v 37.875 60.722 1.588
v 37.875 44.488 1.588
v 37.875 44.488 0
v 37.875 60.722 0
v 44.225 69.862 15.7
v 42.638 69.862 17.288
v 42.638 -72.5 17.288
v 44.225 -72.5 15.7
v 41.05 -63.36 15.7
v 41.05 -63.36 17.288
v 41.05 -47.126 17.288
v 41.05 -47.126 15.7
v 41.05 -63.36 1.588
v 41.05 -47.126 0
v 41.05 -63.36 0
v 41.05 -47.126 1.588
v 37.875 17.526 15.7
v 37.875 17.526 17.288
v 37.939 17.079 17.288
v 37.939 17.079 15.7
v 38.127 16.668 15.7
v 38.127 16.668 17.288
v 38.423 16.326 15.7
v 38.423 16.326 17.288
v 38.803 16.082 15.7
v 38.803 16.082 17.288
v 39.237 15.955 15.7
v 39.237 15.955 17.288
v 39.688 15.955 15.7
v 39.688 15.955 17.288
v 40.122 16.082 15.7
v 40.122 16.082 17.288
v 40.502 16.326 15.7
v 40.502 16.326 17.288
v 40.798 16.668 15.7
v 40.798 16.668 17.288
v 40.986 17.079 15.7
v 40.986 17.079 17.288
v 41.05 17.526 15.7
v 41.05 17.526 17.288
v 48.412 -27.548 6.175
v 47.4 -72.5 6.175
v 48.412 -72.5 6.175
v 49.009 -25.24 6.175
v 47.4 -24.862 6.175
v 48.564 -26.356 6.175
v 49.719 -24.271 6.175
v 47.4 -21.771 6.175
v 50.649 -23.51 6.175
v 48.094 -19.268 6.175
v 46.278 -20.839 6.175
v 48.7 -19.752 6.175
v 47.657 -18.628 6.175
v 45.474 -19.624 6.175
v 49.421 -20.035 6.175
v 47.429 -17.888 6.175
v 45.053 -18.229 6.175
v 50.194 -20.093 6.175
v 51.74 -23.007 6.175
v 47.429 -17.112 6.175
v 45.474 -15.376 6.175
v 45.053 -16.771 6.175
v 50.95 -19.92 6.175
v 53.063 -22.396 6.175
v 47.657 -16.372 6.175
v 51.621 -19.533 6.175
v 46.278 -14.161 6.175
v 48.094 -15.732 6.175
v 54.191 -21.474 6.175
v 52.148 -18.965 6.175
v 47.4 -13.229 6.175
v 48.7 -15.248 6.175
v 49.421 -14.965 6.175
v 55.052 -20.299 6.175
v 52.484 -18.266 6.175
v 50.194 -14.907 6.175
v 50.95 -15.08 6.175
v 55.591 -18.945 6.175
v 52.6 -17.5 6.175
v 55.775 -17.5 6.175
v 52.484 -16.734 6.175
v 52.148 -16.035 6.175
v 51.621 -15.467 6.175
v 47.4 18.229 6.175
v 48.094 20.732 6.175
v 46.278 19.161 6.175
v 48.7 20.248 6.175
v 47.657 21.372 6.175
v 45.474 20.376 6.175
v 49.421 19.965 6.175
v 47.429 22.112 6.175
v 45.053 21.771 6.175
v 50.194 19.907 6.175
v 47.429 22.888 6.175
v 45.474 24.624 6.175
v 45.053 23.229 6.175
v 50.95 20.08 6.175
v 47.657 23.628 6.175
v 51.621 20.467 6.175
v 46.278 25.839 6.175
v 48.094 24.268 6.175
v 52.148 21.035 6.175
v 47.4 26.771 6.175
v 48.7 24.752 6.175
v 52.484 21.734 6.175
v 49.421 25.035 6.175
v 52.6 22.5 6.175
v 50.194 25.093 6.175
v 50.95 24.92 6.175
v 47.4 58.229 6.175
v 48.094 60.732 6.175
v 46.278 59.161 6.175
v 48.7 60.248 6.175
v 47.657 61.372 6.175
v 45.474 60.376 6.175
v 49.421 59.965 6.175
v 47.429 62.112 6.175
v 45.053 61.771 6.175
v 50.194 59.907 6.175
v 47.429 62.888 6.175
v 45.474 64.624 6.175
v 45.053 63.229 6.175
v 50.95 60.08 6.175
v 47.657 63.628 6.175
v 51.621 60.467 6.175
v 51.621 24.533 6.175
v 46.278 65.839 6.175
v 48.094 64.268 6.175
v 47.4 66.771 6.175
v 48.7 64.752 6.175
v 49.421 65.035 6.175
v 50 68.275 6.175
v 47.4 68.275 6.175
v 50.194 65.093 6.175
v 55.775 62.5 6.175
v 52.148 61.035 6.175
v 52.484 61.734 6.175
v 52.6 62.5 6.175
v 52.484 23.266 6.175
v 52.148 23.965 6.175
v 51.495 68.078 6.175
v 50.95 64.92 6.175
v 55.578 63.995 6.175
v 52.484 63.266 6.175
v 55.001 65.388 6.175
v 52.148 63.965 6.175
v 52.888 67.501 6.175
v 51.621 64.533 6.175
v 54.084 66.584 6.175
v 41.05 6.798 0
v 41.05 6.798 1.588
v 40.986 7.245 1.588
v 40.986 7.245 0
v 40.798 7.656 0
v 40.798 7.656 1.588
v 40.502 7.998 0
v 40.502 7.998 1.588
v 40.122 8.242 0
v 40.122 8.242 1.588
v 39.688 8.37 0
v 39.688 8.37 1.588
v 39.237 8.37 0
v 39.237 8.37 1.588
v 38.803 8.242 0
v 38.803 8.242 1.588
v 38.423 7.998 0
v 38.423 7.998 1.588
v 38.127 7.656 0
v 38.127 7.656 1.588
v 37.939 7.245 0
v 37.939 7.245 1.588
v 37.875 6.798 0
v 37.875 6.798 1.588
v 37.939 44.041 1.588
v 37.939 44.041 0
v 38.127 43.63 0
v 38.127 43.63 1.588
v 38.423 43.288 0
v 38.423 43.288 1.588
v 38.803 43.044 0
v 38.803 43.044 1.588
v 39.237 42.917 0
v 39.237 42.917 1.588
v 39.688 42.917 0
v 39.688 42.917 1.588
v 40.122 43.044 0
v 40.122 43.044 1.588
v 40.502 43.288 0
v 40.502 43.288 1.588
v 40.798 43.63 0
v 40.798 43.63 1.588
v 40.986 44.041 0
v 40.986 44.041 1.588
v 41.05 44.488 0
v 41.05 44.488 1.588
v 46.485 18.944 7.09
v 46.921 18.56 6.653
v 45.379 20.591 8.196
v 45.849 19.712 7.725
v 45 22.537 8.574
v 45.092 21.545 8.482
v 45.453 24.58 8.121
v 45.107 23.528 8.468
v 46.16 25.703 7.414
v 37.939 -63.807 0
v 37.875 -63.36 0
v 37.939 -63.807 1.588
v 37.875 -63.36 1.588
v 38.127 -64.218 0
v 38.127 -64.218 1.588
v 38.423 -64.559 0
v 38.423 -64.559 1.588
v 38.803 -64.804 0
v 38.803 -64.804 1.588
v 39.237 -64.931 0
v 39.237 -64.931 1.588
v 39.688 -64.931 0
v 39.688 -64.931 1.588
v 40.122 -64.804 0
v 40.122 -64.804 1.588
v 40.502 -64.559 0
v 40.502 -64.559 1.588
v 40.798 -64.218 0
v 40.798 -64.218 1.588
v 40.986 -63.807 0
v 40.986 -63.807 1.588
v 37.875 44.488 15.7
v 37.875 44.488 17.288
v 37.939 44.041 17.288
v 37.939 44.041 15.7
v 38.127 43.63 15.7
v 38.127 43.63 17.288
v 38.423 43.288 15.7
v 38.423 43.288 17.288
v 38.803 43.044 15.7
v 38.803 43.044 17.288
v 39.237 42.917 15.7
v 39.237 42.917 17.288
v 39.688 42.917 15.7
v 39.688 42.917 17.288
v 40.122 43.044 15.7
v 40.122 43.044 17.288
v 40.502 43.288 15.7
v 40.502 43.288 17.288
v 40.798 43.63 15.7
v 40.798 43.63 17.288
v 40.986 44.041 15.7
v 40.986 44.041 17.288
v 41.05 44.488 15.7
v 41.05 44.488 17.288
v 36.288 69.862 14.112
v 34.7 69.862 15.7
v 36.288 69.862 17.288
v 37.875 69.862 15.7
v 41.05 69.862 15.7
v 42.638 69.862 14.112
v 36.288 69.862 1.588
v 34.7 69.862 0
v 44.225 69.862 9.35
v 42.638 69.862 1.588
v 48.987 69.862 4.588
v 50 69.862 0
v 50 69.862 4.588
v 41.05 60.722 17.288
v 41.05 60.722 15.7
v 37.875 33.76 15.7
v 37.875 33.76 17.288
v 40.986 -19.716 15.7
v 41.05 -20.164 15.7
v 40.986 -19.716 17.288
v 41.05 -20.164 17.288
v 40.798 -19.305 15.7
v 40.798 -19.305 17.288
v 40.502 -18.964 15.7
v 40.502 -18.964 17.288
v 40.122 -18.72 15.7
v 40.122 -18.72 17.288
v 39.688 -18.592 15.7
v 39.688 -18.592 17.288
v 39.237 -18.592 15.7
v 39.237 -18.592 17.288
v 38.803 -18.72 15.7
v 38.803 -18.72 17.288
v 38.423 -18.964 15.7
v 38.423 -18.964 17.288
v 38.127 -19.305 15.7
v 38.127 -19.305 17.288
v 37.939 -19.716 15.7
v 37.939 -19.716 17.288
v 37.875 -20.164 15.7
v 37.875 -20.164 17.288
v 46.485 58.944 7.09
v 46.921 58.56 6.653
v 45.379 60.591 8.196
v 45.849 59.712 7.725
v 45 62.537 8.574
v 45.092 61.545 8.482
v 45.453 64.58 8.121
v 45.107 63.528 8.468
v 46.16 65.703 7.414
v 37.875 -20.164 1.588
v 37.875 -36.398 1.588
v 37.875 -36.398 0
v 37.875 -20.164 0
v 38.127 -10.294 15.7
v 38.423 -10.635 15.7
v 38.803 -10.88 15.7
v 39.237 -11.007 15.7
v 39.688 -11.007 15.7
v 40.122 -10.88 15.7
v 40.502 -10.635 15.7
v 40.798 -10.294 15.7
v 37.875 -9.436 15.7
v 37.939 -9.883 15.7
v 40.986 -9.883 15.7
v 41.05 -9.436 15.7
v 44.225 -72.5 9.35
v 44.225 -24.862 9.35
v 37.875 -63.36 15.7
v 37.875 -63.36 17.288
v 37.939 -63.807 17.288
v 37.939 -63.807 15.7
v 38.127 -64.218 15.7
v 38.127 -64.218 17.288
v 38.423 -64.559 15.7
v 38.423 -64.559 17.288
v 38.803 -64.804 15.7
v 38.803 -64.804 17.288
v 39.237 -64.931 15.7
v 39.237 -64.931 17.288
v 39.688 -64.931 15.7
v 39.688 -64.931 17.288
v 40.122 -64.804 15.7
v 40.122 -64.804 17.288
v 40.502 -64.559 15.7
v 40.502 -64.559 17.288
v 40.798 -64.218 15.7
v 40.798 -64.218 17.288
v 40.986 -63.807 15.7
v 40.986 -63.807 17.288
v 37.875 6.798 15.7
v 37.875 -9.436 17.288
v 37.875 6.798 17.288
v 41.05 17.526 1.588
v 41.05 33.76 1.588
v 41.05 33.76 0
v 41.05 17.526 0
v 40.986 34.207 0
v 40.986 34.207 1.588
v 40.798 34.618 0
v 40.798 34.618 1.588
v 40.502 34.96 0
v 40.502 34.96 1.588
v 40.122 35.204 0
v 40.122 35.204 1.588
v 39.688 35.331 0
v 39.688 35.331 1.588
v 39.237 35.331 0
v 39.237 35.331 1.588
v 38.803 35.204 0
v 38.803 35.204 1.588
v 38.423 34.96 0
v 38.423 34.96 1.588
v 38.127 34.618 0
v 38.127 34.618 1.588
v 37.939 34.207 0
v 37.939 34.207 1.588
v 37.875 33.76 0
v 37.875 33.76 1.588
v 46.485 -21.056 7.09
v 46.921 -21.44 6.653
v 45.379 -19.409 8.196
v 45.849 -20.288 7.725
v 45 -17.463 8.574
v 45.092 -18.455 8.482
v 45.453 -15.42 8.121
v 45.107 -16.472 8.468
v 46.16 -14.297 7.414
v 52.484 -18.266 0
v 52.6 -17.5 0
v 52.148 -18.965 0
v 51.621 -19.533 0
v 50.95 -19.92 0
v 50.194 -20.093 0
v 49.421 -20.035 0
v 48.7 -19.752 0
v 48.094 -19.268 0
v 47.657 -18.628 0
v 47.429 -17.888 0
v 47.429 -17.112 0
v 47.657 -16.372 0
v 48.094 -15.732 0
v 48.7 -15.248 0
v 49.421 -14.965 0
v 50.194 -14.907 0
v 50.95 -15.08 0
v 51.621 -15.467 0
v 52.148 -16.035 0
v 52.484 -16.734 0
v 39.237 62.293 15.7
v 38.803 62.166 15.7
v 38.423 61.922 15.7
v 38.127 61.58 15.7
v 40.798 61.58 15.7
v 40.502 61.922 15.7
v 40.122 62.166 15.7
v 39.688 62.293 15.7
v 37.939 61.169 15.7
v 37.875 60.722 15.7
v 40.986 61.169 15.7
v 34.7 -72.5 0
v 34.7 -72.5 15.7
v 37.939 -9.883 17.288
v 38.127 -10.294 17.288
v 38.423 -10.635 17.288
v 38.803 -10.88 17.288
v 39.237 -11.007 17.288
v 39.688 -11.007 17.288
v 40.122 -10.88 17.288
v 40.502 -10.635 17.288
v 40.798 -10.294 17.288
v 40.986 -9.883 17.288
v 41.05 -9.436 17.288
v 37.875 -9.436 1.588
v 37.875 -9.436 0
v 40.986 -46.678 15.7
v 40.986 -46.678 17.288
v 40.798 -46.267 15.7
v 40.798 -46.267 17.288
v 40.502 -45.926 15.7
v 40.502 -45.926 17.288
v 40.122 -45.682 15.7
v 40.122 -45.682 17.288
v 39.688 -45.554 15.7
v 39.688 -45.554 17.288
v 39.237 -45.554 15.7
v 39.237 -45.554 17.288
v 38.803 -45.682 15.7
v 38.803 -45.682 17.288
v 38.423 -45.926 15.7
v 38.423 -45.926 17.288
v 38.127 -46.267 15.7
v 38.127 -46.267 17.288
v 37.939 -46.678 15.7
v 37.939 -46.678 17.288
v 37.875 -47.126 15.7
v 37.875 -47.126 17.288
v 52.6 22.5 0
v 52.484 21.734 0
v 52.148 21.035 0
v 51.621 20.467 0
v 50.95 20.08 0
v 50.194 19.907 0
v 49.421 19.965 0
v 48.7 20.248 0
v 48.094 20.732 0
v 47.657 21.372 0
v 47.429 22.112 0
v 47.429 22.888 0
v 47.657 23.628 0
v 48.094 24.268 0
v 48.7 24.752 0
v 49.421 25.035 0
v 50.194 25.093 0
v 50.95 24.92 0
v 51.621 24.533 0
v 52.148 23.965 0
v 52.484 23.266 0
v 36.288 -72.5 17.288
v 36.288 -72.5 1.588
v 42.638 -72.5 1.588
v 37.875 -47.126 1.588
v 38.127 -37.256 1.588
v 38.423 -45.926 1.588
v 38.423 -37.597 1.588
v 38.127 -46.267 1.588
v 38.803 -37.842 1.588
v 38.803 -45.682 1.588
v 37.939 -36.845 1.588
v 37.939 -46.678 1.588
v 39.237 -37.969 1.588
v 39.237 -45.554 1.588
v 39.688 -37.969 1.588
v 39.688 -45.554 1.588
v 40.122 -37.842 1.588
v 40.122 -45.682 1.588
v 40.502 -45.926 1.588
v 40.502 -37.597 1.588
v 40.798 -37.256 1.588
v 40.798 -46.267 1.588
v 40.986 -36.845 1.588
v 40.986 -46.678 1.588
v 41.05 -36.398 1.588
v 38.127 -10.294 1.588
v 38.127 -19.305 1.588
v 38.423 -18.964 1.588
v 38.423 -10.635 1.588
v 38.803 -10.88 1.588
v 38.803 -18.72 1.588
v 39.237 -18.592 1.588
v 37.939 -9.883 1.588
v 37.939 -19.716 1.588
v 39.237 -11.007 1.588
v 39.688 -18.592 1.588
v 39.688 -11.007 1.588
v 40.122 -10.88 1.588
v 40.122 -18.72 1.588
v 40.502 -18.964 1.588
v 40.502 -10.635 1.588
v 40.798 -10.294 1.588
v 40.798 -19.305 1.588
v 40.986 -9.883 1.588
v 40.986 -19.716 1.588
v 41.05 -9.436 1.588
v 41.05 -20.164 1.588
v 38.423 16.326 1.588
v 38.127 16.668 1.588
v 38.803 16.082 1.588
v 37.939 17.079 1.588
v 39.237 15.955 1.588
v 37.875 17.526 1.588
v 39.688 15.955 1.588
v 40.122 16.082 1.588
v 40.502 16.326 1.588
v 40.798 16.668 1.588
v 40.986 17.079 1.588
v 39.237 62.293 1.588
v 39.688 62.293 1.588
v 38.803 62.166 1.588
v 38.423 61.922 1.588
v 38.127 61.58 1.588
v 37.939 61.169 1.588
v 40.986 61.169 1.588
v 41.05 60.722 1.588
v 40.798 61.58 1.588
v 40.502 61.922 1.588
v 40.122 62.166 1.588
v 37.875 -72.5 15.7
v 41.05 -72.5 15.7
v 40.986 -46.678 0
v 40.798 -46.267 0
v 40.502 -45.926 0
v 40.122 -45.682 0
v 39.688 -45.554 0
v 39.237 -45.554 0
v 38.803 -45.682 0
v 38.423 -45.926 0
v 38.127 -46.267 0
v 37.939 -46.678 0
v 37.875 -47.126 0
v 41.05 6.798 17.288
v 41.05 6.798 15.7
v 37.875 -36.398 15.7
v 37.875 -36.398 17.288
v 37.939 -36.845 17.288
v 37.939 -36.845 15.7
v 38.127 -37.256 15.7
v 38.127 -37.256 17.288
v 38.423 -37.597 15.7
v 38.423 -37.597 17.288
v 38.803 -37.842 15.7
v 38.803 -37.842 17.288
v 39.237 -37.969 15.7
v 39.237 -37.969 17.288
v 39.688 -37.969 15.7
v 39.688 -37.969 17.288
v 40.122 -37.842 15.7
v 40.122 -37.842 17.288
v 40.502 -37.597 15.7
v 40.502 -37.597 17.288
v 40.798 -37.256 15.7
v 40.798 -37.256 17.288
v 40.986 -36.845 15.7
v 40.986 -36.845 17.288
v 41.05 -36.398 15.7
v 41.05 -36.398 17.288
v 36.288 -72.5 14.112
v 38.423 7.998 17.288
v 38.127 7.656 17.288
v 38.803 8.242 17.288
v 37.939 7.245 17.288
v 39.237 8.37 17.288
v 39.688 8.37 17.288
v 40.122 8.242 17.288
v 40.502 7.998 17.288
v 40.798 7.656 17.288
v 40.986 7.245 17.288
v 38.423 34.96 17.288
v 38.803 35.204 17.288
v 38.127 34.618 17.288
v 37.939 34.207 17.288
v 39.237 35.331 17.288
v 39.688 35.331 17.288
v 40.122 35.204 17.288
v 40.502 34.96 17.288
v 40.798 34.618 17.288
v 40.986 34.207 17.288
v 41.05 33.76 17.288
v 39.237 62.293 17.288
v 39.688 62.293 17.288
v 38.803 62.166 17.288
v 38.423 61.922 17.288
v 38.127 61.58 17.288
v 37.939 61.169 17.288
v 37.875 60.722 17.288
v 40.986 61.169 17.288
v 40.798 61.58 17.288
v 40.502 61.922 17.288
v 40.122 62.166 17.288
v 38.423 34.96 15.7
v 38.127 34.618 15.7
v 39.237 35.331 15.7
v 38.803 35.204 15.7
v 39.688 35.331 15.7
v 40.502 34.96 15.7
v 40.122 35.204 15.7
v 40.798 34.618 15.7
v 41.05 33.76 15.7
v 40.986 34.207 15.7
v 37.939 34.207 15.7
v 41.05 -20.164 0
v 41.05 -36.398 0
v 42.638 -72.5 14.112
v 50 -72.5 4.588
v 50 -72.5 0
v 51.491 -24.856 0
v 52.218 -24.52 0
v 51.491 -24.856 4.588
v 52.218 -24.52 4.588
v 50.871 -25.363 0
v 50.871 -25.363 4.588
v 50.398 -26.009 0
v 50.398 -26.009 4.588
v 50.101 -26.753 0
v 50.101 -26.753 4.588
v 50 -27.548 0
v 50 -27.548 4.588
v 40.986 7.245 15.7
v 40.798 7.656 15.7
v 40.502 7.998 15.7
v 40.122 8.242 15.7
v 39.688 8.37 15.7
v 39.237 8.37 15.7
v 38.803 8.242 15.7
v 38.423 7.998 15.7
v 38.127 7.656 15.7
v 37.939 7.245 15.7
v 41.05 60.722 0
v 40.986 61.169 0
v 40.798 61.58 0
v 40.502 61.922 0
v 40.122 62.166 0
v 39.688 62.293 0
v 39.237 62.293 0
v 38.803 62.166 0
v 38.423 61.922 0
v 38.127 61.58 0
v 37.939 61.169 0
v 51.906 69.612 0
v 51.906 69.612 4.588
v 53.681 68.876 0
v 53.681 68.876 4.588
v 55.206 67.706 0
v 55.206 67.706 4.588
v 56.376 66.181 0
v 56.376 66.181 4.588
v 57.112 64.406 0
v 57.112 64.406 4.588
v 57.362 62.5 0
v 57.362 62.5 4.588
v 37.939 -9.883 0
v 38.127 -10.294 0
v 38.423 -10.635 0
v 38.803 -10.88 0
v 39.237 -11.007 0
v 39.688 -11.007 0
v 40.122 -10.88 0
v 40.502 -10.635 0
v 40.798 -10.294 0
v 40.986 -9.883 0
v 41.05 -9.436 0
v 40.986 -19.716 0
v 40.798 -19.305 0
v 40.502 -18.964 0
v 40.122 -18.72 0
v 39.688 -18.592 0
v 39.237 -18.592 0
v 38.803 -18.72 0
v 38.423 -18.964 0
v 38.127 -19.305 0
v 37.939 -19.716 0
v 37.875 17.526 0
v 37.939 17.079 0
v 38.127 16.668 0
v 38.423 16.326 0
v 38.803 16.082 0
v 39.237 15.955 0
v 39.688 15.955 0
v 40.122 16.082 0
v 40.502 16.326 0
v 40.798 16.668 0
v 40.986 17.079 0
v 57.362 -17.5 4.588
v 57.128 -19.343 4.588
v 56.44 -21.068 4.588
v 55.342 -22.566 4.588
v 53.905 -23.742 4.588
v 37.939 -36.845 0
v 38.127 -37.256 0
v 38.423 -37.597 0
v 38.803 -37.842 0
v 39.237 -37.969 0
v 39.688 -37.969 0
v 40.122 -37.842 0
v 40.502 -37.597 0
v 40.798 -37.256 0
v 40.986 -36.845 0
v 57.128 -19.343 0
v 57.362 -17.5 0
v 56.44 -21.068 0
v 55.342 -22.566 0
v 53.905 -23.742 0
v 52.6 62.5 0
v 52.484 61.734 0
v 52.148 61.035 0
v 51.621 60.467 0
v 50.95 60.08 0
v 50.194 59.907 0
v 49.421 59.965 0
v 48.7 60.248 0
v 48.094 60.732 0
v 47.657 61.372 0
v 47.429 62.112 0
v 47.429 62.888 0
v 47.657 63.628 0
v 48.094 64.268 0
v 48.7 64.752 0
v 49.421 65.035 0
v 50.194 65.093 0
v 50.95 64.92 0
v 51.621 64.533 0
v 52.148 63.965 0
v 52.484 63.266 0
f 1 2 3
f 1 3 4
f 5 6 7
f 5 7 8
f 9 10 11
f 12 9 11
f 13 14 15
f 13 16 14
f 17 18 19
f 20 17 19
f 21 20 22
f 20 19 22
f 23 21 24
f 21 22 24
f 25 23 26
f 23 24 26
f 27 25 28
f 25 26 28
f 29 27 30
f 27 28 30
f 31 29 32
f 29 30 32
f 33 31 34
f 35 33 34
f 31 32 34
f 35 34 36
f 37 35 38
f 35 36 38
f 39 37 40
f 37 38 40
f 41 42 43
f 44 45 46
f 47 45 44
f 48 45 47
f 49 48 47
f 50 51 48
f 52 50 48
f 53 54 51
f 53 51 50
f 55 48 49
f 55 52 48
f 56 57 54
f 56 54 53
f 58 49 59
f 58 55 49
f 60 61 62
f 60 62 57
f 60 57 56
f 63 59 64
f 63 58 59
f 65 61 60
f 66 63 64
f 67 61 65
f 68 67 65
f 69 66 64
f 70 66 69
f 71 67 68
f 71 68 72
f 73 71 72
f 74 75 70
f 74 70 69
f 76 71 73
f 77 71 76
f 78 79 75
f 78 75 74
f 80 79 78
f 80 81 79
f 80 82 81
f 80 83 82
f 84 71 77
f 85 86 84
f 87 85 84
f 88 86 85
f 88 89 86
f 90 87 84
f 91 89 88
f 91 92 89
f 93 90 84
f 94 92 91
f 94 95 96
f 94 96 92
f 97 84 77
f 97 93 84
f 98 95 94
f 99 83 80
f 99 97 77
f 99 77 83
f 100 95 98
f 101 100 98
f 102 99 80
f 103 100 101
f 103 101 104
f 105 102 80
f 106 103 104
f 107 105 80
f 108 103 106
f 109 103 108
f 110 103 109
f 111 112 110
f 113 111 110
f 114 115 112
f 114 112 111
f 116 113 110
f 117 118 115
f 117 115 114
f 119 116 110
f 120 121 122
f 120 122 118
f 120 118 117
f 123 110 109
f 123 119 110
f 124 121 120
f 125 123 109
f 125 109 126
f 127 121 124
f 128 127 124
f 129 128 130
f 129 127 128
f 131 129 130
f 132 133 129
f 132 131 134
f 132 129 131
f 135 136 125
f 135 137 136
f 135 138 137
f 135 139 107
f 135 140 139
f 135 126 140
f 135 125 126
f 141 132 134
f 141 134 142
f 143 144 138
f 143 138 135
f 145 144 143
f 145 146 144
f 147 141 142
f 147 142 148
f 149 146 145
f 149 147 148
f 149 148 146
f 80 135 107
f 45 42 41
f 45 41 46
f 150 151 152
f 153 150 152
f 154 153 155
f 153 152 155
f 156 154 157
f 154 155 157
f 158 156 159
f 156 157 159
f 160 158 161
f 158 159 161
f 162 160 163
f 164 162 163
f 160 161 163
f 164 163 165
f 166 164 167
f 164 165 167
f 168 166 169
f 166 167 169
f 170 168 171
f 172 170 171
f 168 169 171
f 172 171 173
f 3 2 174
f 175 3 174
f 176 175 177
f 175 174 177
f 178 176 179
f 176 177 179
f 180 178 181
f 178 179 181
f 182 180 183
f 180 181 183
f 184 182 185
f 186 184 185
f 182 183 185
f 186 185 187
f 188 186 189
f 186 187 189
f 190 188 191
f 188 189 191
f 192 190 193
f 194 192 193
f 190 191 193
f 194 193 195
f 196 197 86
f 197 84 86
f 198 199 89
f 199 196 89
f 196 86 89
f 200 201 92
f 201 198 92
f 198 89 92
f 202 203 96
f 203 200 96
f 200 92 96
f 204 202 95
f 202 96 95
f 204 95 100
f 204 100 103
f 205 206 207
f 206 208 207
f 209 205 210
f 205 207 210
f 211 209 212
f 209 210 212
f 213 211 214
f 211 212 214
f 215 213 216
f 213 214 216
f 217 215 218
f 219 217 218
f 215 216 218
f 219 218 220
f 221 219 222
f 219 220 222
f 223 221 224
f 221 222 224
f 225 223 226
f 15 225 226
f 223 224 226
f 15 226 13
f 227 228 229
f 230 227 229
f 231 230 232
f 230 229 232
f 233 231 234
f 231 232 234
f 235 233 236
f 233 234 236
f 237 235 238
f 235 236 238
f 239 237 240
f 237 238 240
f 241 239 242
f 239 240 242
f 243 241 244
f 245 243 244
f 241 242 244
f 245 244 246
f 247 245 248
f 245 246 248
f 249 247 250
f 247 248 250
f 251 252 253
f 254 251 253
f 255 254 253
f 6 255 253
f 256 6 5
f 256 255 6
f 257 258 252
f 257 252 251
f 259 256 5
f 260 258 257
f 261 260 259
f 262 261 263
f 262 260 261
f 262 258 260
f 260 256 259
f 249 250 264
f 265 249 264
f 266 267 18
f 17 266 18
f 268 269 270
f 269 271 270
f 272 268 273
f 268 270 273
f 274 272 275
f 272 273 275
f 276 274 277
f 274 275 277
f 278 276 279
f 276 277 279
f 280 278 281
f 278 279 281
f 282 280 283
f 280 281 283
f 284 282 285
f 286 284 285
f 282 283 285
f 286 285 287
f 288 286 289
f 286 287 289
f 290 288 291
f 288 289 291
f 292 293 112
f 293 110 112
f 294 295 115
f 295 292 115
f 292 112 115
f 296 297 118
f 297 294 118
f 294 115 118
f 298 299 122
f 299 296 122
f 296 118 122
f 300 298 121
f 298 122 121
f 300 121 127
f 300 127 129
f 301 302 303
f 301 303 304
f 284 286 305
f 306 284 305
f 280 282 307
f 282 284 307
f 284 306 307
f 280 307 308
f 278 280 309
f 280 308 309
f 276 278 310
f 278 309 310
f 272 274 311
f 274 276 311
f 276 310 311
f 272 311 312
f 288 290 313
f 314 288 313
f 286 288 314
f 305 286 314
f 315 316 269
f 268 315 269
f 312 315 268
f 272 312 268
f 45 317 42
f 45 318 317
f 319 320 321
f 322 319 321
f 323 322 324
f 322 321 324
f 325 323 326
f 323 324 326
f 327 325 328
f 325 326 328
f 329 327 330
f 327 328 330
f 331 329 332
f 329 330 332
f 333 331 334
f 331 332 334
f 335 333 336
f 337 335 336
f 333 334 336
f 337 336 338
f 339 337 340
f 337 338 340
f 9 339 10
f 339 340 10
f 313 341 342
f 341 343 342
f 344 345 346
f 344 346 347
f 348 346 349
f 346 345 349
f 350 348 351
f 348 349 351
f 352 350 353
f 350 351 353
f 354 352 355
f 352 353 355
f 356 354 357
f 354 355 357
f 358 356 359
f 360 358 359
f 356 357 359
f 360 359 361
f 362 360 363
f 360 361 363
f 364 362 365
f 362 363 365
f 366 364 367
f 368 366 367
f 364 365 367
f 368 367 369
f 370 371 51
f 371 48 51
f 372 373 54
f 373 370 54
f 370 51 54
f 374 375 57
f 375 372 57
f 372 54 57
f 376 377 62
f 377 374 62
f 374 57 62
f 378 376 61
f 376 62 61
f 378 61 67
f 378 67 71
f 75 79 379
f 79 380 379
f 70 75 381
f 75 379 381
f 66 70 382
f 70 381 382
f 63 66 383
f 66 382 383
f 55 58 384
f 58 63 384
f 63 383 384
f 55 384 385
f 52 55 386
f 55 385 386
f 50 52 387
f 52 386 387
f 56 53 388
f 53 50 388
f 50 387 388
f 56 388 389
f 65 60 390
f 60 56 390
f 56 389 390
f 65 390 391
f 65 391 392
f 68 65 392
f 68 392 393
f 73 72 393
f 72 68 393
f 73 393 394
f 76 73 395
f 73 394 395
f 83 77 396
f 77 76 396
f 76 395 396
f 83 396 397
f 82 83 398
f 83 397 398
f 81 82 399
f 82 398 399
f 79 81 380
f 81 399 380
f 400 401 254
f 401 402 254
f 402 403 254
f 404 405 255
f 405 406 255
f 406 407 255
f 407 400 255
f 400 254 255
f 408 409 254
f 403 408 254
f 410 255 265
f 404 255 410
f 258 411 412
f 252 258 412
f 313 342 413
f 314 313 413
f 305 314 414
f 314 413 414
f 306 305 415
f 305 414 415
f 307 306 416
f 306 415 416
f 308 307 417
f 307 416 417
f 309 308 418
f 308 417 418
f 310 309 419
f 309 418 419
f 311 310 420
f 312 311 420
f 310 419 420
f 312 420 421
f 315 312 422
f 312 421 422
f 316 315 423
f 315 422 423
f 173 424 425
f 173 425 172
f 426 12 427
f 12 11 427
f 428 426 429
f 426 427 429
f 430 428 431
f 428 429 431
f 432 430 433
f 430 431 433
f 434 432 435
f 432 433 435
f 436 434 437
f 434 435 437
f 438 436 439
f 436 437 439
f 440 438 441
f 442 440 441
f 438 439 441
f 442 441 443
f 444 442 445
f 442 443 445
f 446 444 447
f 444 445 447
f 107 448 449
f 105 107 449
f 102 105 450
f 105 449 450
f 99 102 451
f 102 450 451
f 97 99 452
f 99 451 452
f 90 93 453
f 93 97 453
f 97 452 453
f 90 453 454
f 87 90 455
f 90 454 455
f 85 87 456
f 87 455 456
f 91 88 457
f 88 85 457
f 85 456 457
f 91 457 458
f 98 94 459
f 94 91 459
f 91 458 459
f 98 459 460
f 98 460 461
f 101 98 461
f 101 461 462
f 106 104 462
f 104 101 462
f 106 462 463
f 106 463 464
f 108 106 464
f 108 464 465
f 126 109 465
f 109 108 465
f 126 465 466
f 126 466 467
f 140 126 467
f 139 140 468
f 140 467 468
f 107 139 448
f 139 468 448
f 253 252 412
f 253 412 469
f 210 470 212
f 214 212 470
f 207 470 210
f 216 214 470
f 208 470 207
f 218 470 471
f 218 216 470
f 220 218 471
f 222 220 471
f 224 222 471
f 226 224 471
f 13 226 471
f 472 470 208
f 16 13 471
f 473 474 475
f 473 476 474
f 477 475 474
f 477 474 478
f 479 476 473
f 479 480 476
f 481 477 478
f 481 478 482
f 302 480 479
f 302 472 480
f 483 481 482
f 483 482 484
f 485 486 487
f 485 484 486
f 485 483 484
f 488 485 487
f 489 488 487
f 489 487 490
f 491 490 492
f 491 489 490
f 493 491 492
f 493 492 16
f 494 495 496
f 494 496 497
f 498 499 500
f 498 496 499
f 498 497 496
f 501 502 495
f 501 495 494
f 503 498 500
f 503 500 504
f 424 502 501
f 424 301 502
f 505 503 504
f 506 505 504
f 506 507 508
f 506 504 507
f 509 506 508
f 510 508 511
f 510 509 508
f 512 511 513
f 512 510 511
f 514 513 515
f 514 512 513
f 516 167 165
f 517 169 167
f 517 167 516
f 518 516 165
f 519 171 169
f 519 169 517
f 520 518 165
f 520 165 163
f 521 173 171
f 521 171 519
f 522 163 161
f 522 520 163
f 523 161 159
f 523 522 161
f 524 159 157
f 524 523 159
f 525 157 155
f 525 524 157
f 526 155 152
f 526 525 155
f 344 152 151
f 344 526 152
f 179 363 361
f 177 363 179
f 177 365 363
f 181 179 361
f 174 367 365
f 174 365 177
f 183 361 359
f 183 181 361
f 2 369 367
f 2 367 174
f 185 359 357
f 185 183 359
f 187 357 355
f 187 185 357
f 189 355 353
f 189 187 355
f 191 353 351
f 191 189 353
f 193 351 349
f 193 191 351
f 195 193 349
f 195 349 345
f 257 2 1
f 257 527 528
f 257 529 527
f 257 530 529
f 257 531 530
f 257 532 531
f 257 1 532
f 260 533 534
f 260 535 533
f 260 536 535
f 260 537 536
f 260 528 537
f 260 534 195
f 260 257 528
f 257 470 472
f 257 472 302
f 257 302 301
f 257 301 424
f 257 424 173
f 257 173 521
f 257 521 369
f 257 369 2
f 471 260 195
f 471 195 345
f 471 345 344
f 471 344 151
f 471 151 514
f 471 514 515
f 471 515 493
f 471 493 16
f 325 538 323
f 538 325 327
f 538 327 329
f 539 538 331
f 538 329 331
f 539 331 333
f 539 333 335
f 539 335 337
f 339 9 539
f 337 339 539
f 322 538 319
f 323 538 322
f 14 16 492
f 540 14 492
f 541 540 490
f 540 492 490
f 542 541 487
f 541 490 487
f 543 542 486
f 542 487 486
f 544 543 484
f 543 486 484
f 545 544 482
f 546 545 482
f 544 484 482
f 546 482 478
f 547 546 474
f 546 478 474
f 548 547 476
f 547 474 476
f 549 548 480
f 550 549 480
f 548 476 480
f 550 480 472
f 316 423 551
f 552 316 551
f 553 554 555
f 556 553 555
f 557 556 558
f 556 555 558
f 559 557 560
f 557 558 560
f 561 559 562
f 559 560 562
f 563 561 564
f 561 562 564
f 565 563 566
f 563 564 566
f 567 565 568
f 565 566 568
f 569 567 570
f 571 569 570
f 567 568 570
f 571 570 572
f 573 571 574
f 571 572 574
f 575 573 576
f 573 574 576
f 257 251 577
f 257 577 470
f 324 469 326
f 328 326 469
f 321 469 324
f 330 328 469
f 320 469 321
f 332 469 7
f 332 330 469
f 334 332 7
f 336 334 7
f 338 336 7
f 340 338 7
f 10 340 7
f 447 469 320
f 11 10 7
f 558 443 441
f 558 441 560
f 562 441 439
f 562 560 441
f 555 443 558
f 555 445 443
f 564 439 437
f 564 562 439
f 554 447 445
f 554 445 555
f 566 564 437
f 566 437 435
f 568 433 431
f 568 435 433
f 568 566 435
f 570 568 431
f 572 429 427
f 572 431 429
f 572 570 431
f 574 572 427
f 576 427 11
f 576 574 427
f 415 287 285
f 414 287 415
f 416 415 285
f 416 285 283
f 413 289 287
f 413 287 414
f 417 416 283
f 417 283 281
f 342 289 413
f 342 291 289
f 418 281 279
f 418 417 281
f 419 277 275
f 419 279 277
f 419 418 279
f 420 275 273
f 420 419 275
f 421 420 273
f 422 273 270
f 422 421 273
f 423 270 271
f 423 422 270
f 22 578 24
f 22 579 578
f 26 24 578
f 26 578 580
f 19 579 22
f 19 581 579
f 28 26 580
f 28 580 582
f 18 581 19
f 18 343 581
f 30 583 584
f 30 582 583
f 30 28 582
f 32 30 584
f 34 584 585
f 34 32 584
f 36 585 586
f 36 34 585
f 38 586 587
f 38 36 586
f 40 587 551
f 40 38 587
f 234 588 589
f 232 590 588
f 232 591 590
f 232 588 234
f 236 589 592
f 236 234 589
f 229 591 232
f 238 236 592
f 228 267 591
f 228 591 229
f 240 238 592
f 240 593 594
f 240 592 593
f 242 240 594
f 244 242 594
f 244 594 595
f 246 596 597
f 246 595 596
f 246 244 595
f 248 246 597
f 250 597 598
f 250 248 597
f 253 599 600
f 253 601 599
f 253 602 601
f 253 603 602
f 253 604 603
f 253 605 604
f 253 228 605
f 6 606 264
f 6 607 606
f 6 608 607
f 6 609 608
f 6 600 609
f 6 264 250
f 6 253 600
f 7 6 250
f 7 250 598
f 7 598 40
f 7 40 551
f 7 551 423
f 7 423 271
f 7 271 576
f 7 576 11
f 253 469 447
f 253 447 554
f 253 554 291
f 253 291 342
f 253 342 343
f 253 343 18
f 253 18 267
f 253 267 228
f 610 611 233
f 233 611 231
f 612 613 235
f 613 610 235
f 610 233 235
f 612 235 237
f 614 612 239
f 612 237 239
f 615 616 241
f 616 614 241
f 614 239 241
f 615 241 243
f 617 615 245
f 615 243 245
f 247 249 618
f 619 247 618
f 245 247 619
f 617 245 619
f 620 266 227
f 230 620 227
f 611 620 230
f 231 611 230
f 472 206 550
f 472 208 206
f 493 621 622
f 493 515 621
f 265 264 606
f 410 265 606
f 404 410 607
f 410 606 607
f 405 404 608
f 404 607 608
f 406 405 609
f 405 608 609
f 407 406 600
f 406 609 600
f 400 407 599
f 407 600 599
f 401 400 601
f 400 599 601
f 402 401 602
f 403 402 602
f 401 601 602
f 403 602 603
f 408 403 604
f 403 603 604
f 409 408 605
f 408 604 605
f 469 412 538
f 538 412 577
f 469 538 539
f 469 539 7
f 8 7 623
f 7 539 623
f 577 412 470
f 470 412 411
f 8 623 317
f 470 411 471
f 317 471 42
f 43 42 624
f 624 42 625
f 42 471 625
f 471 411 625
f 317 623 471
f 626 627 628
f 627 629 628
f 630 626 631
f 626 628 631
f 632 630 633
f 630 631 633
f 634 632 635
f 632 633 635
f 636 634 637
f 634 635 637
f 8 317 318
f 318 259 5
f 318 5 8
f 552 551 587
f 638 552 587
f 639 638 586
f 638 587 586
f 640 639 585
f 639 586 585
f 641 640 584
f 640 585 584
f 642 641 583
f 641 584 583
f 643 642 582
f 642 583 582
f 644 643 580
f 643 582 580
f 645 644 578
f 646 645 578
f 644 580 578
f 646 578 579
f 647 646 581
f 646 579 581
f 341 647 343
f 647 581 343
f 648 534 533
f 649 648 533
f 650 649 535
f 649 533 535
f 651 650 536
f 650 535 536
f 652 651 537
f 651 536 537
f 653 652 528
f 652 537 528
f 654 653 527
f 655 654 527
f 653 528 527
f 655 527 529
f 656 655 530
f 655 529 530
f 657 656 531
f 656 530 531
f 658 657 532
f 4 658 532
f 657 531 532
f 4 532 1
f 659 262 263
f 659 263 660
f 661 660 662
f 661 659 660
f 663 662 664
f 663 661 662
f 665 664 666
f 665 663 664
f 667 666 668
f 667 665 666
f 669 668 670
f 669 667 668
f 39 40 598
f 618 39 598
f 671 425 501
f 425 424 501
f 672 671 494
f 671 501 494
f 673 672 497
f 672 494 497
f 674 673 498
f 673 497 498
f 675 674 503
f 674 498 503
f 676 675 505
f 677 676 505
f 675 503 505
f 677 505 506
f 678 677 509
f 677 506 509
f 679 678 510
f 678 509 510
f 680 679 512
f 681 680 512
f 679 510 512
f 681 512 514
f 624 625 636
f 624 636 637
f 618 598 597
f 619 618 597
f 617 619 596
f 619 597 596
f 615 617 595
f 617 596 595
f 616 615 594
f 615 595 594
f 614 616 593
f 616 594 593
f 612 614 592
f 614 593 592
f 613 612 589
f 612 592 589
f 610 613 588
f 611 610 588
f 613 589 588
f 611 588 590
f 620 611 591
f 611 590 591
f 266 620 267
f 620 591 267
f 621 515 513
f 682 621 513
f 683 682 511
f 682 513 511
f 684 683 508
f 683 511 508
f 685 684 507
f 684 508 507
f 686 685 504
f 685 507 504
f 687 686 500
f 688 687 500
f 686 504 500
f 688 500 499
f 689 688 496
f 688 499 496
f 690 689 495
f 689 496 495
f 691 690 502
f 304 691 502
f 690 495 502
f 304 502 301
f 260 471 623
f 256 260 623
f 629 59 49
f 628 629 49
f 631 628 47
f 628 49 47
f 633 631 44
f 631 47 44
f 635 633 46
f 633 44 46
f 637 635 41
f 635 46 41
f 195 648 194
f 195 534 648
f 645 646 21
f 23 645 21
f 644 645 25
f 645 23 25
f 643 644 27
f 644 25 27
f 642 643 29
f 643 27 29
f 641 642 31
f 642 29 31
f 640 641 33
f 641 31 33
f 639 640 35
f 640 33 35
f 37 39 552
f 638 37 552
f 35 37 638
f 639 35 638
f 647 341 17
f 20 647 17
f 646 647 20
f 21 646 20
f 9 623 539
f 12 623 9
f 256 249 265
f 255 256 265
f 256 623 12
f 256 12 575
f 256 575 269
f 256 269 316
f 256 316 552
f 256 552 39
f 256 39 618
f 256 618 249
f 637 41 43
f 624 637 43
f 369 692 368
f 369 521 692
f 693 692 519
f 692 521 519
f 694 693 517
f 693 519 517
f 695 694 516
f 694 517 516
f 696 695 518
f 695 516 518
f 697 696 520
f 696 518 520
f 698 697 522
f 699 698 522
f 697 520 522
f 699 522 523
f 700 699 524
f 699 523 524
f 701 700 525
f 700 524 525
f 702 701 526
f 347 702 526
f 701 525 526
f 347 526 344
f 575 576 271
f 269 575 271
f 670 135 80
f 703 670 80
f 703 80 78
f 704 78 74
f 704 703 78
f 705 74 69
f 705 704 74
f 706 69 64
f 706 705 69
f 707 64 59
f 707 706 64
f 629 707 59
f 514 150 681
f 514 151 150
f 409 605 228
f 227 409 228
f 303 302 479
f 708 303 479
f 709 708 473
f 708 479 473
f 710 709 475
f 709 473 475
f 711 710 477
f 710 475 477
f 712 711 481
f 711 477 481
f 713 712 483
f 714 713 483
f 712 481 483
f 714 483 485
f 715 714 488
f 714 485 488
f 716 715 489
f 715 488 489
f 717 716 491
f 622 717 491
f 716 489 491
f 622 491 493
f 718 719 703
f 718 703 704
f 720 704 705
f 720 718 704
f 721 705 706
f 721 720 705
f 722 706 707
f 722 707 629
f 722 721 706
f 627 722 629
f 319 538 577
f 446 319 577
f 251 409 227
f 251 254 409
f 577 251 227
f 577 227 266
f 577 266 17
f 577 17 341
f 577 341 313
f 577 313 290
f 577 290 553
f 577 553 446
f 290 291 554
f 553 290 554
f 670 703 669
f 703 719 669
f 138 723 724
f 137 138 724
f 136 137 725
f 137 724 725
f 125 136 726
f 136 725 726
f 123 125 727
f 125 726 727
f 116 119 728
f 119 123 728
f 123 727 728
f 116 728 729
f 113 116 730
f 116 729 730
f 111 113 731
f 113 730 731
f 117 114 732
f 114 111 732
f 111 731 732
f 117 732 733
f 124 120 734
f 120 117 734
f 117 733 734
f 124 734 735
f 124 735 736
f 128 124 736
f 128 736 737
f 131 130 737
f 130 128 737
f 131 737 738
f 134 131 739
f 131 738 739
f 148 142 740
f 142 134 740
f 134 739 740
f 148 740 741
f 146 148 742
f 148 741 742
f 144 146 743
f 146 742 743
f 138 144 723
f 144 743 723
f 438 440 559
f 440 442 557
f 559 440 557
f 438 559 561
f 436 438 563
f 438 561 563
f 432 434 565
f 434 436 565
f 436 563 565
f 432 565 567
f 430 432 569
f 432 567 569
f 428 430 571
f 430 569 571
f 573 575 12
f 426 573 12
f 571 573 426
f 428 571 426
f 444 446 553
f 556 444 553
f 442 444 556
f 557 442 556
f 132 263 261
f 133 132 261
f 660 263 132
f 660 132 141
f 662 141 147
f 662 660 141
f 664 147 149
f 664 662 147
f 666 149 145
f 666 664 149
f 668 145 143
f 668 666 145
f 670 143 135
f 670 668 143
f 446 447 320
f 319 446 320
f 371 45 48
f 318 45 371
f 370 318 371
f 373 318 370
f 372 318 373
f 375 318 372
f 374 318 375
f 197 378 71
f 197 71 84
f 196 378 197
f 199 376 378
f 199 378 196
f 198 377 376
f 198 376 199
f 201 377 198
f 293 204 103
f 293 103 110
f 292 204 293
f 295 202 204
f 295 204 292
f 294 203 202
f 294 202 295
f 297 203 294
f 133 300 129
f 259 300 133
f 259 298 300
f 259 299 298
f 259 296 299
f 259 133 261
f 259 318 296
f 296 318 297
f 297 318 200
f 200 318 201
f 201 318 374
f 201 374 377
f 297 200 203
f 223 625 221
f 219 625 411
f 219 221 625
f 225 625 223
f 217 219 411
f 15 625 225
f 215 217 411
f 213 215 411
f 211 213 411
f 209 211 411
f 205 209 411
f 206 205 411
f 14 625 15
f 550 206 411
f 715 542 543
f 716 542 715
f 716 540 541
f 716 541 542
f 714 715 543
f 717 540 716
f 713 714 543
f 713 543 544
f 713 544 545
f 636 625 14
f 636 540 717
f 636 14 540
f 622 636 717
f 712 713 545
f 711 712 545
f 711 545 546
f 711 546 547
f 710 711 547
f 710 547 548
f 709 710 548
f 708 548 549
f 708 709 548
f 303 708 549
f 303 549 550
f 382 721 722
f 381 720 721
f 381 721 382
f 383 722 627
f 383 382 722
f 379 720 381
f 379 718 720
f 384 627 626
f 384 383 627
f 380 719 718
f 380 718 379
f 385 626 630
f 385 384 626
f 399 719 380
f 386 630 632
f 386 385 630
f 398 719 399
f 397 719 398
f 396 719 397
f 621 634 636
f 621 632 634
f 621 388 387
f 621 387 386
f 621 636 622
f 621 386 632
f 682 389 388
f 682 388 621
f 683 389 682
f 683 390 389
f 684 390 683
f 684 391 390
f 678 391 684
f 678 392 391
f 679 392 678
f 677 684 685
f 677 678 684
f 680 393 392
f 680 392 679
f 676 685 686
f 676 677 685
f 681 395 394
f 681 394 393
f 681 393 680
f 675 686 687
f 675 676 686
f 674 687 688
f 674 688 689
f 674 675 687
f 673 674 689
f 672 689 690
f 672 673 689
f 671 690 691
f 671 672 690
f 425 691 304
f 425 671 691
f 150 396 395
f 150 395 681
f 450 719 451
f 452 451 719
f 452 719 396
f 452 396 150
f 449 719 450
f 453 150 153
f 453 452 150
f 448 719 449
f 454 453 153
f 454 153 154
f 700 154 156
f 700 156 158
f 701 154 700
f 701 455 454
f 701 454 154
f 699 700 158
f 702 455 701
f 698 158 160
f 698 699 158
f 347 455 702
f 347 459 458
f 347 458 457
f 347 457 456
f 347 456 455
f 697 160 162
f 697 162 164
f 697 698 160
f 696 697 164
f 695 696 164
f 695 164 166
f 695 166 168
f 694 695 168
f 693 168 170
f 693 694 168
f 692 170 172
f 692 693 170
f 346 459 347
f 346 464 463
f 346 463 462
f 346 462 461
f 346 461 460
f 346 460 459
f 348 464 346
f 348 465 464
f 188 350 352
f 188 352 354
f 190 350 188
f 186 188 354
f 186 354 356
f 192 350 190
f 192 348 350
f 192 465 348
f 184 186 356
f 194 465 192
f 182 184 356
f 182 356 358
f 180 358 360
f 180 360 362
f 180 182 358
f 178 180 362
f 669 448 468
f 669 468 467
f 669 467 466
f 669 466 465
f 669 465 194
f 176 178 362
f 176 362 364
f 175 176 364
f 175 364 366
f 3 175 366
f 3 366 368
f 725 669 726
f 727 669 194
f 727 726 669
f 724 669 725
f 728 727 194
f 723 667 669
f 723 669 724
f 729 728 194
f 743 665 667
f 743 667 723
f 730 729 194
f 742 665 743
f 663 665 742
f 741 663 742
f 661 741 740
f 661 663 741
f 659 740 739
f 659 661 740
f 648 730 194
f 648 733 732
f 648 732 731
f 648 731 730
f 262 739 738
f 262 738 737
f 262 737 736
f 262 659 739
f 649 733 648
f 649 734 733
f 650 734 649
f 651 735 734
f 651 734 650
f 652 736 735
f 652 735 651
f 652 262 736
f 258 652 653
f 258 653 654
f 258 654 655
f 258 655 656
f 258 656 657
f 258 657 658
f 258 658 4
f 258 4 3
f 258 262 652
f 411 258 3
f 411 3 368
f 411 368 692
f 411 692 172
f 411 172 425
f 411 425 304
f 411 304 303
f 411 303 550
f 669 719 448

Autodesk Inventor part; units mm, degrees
ref_plane "Work Plane1" through (0, 0, 0) normal (0, 0, 1) x (1, 0, 0)
sketch "Sketch1" plane through (0, 0, 0) normal (0, 0, 1) x (1, 0, 0)
  circle A0 centre (50, -17.5) radius 2.6 projected
  circle A1 centre (50, 22.5) radius 2.6 projected
  circle A2 centre (50, 62.5) radius 2.6 projected
  circle A3 centre (50, -17.5) radius 7.3625 construction
  circle A4 centre (50, 22.5) radius 7.3625 construction
  circle A5 centre (50, 62.5) radius 7.3625 construction
  line L0 (50, -24.8625) -> (42.6375, -24.8625)
  line L1 (42.6375, -24.8625) -> (42.6375, 69.8625)
  line L2 (42.6375, 69.8625) -> (50, 69.8625)
  line L3 (57.3625, -17.5) -> (57.3625, 62.5)
  arc A6 (50, -24.8625) -> (57.3625, -17.5) centre (50, -17.5) ccw
  arc A7 (57.3625, 62.5) -> (50, 69.8625) centre (50, 62.5) ccw
  circle A8 centre (50, -17.5) radius 5 construction
  point P0 (0, 0)
  dimension "d0" = 4.7625
  dimension "d1" = 10
extrude "Extrusion1" add sketch "Sketch1" along normal blind 6.175
sketch "Sketch2" plane through (0, 0, 6.175) normal (0, 0, 1) x (1, 0, 0)
  line L0 (42.6375, 69.8625) -> (42.6375, -24.8625) projected
  circle A0 centre (50, -17.5) radius 2.6 projected
  circle A1 centre (50, -17.5) radius 5 construction
  line L1 (42.6375, -24.8625) -> (50, -24.8625) construction
  line L2 (44.225, -24.8625) -> (44.225, 69.8625)
  line L3 (42.6375, 69.8625) -> (44.225, 69.8625)
  line L4 (42.6375, -24.8625) -> (44.225, -24.8625)
  point P0 (0, 0)
  dimension "d4" = 10
  dimension "d34" = 1.5875
ref_plane "Work Plane2" through (40.2375, 90.7678, 31.75) normal (0, 0, 1) x (1, 0, 0)
extrude "Extrusion2" add sketch "Sketch2" along normal blind 9.525 contours L3 L2 L4 L0
chamfer "Chamfer1" distance 3.175 angle 45 1 edges at (44.225, 22.5, 6.175)
sketch "Sketch3" plane through (0, 0, 6.175) normal (0, 0, 1) x (1, 0, 0)
  circle A0 centre (50, -17.5) radius 2.6 projected
  circle A1 centre (50, -17.5) radius 5
  circle A2 centre (50, 22.5) radius 2.6 projected
  circle A3 centre (50, 62.5) radius 2.6 projected
  circle A4 centre (50, 22.5) radius 5
  circle A5 centre (50, 62.5) radius 5
  point P0 (0, 0)
  point P1 (48.175, -15.6481)
  point P2 (48.175, -19.3519)
  point P3 (48.175, 24.3519)
  point P4 (48.175, 20.6481)
  point P5 (48.175, 64.3519)
  point P6 (48.175, 60.6481)
  dimension "d10" = 10
extrude "Extrusion3" cut sketch "Sketch3" along normal blind 25.4 contours A0 | A1 | A2 | A3 | A4 | A5
sketch "Sketch4" plane through (0, 0, 15.7) normal (0, 0, 1) x (1, 0, 0)
  line L0 (42.6375, -24.8625) -> (44.225, -24.8625) projected
  line L1 (44.225, -24.8625) -> (34.7, -24.8625)
  line L2 (34.7, -24.8625) -> (34.7, 69.8625)
  line L3 (34.7, 69.8625) -> (44.225, 69.8625)
  line L4 (44.225, 69.8625) -> (44.225, -24.8625)
  line L5 (44.225, 69.8625) -> (42.6375, 69.8625) projected
  line L6 (34.7, -24.8625) -> (36.2875, -24.8625)
  line L7 (36.2875, -24.8625) -> (36.2875, 69.8625)
  line L8 (36.2875, 69.8625) -> (34.7, 69.8625)
  line L9 (34.7, 69.8625) -> (34.7, -24.8625)
  line L10 (42.6375, 69.8625) -> (42.6375, -24.8625) projected
  point P0 (0, 0)
  dimension "d13" = 9.525
  dimension "d15" = 1.5875
  dimension "d16" = 1.5875
ref_plane "Work Plane3" through (-55.775, -68.275, 0) normal (0, 0, 1) x (1, 0, 0)
extrude "Extrusion4" add sketch "Sketch4" against normal up to surface (15.7 mm away) contours L1 L2 L3 L7
sketch "Sketch5" plane through (0, 0, 15.7) normal (0, 0, 1) x (1, 0, 0)
  line L0 (34.7, -24.8625) -> (34.7, 69.8625) projected
  line L1 (50, 69.8625) -> (42.6375, 69.8625) projected
  line L2 (34.7, -24.8625) -> (44.225, -24.8625)
  line L3 (44.225, -24.8625) -> (44.225, 69.8625)
  line L4 (44.225, 69.8625) -> (34.7, 69.8625)
  line L5 (34.7, 69.8625) -> (34.7, -24.8625)
  line L6 (44.225, -24.8625) -> (44.225, 69.8625) projected
  point P0 (0, 0)
extrude "Extrusion5" add sketch "Sketch5" along normal blind 1.5875
chamfer "Chamfer2" distance 1.5875 angle 45 4 edges at (44.225, 22.5, 17.2875) (34.7, 22.5, 17.2875) (36.2875, 22.5, 15.7) (42.6375, 22.5, 15.7)
sketch "Sketch7" plane through (42.6375, -24.8625, 0) normal (0, -1, 0) x (1, 0, 0)
  point P0 (-42.6375, 0)
sketch "Sketch8" plane through (42.6375, -24.8625, 0) normal (0, -1, 0) x (1, 0, 0)
  line L0 (-7.9375, 15.7) -> (-6.35, 17.2875) projected
  line L1 (-7.9375, 0) -> (-7.9375, 15.7) projected
  line L2 (-6.35, 0) -> (-7.9375, 0) projected
  line L3 (-6.35, 14.1125) -> (-6.35, 0) projected
  line L4 (-4.7625, 15.7) -> (-6.35, 14.1125) projected
  line L5 (-4.7625, 15.7) -> (-1.5875, 15.7) projected
  line L6 (0, 14.1125) -> (-1.5875, 15.7) projected
  line L7 (0, 0) -> (0, 14.1125) projected
  line L8 (0, 0) -> (7.3625, 0) projected
  line L9 (7.3625, 0) -> (7.3625, 6.175) projected
  line L10 (4.7625, 6.175) -> (7.3625, 6.175) projected
  line L11 (1.5875, 9.35) -> (4.7625, 6.175) projected
  line L12 (1.5875, 9.35) -> (1.5875, 15.7) projected
  line L13 (0, 17.2875) -> (1.5875, 15.7) projected
  line L14 (-6.35, 17.2875) -> (0, 17.2875) projected
  point P0 (-42.6375, 0)
ref_plane "Work Plane4" through (-290, -72.5, -10.037) normal (0, -1, 0) x (1, 0, 0)
extrude "Extrusion7" add sketch "Sketch8" along normal up to surface (47.6375 mm away)
fillet "Fillet1" radius 3.175 1 edges at (50, -24.8625, 3.0875)
sketch "Sketch9" plane through (0, 0, 17.2875) normal (0, 0, 1) x (1, 0, 0)
  line L0 (36.2875, 69.8625) -> (36.2875, -72.5) projected
  line L1 (42.6375, 69.8625) -> (42.6375, -72.5) projected
  line L2 (39.4625, -63.3595) -> (39.4625, -47.1256) construction
  line L3 (41.05, -63.3595) -> (41.05, -47.1256)
  line L4 (37.875, -47.1256) -> (37.875, -63.3595)
  arc A0 (37.875, -63.3595) -> (41.05, -63.3595) centre (39.4625, -63.3595) ccw
  arc A1 (41.05, -47.1256) -> (37.875, -47.1256) centre (39.4625, -47.1256) ccw
  line L5 (36.2875, -72.5) -> (42.6375, -72.5) projected
  line L6 (39.4625, -36.3976) -> (39.4625, -20.1637) construction
  line L7 (41.05, -36.3976) -> (41.05, -20.1637)
  line L8 (37.875, -20.1637) -> (37.875, -36.3976)
  arc A2 (37.875, -36.3976) -> (41.05, -36.3976) centre (39.4625, -36.3976) ccw
  arc A3 (41.05, -20.1637) -> (37.875, -20.1637) centre (39.4625, -20.1637) ccw
  line L9 (39.4625, -9.4357) -> (39.4625, 6.7982) construction
  line L10 (41.05, -9.4357) -> (41.05, 6.7982)
  line L11 (37.875, 6.7982) -> (37.875, -9.4357)
  arc A4 (37.875, -9.4357) -> (41.05, -9.4357) centre (39.4625, -9.4357) ccw
  arc A5 (41.05, 6.7982) -> (37.875, 6.7982) centre (39.4625, 6.7982) ccw
  line L12 (39.4625, 17.5262) -> (39.4625, 33.7601) construction
  line L13 (41.05, 17.5262) -> (41.05, 33.7601)
  line L14 (37.875, 33.7601) -> (37.875, 17.5262)
  arc A6 (37.875, 17.5262) -> (41.05, 17.5262) centre (39.4625, 17.5262) ccw
  arc A7 (41.05, 33.7601) -> (37.875, 33.7601) centre (39.4625, 33.7601) ccw
  line L15 (39.4625, 44.4881) -> (39.4625, 60.722) construction
  line L16 (41.05, 44.4881) -> (41.05, 60.722)
  line L17 (37.875, 60.722) -> (37.875, 44.4881)
  arc A8 (37.875, 44.4881) -> (41.05, 44.4881) centre (39.4625, 44.4881) ccw
  arc A9 (41.05, 60.722) -> (37.875, 60.722) centre (39.4625, 60.722) ccw
  line L18 (42.6375, 69.8625) -> (36.2875, 69.8625) projected
  point P0 (0, 0)
  point P1 (39.4625, -55.2425)
  point P2 (39.4625, -72.5)
  point P3 (39.4625, -64.947)
  point P4 (39.4625, -72.5)
  point P5 (39.4625, -28.2806)
  point P6 (39.4625, -1.3187)
  point P7 (39.4625, 25.6431)
  point P8 (39.4625, 52.605)
  point P9 (39.4625, 69.8625)
  point P10 (39.4625, 62.3095)
  point P11 (39.4625, -37.9851)
  point P12 (39.4625, -45.5381)
  point P13 (39.4625, -11.0232)
  point P14 (39.4625, -18.5762)
  point P15 (39.4625, 15.9387)
  point P16 (39.4625, 8.3857)
  point P17 (39.4625, 42.9006)
  point P18 (39.4625, 35.3476)
  dimension "d38" = 1.5875
  dimension "d39" = 7.553
  dimension "d40" = 16.2339
  dimension "d41" = 7.553
  dimension "d46" = 7.553
  dimension "d47" = 7.553
  dimension "d48" = 7.553
  dimension "d49" = 7.553
extrude "Extrusion8" cut sketch "Sketch9" against normal through all contours A0 L4 A1 L3 | A2 L8 A3 L7 | A4 L11 A5 L10 | A6 L14 A7 L13 | A8 L17 A9 L16
sketch "Sketch10" plane through (42.6375, 69.8625, 0) normal (0, 1, 0) x (1, 0, 0)
  line L0 (-6.35, -1.5875) -> (0, -1.5875)
  line L1 (-6.35, -14.1125) -> (-6.35, 0) projected
  line L2 (0, 0) -> (0, -14.1125) projected
  line L3 (26.1975, 0) -> (-54.11, 0) projected
  point P0 (-42.6375, 0)
  dimension "d53" = 1.5875
extrude "Extrusion9" add sketch "Sketch10" against normal up to surface (142.3625 mm away)
chamfer "Chamfer3" distance 1.5875 angle 45 5 edges at (50, -50.0239, 6.175) (55.9388, -21.8517, 6.175) (57.3625, 22.5, 6.175) (55.2061, 67.7061, 6.175) (48.6997, 69.8625, 6.175)
sketch "Sketch11" plane through (36.2875, -72.5, 1.5875) normal (0, 0, 1) x (1, 0, 0)
  line L0 (1.5875, 63.0643) -> (1.5875, 79.2982) projected
  arc A0 (4.7625, 79.2982) -> (1.5875, 79.2982) centre (3.175, 79.2982) ccw projected
  line L1 (4.7625, 79.2982) -> (4.7625, 63.0643) projected
  arc A1 (1.5875, 63.0643) -> (4.7625, 63.0643) centre (3.175, 63.0643) ccw projected
  line L2 (1.5875, 90.0262) -> (1.5875, 106.2601) projected
  arc A2 (4.7625, 106.2601) -> (1.5875, 106.2601) centre (3.175, 106.2601) ccw projected
  line L3 (4.7625, 106.2601) -> (4.7625, 90.0262) projected
  arc A3 (1.5875, 90.0262) -> (4.7625, 90.0262) centre (3.175, 90.0262) ccw projected
  line L4 (1.5875, 36.1024) -> (1.5875, 52.3363) projected
  arc A4 (4.7625, 52.3363) -> (1.5875, 52.3363) centre (3.175, 52.3363) ccw projected
  line L5 (4.7625, 52.3363) -> (4.7625, 36.1024) projected
  arc A5 (1.5875, 36.1024) -> (4.7625, 36.1024) centre (3.175, 36.1024) ccw projected
  line L6 (1.5875, 116.9881) -> (1.5875, 133.222) projected
  arc A6 (4.7625, 133.222) -> (1.5875, 133.222) centre (3.175, 133.222) ccw projected
  line L7 (4.7625, 133.222) -> (4.7625, 116.9881) projected
  arc A7 (1.5875, 116.9881) -> (4.7625, 116.9881) centre (3.175, 116.9881) ccw projected
  line L8 (1.5875, 9.1405) -> (1.5875, 25.3744) projected
  arc A8 (4.7625, 25.3744) -> (1.5875, 25.3744) centre (3.175, 25.3744) ccw projected
  line L9 (4.7625, 25.3744) -> (4.7625, 9.1405) projected
  arc A9 (1.5875, 9.1405) -> (4.7625, 9.1405) centre (3.175, 9.1405) ccw projected
  line L10 (0, 142.3625) -> (0, 0) projected
  line L11 (0, 0) -> (6.35, 0) projected
  line L12 (6.35, 142.3625) -> (6.35, 0) projected
  line L13 (6.35, 142.3625) -> (0, 142.3625) projected
  point P0 (-36.2875, 72.5)
extrude "Extrusion10" cut sketch "Sketch11" against normal blind 25.4 contours L0 A0 L1 A1 | L2 A2 L3 A3 | L4 A4 L5 A5 | L6 A6 L7 A7 | L8 A8 L9 A9
equation "\"d15\" = d16"
equation "\"d41\" = d39"
equation "\"d46\" = d39"
equation "\"d47\" = d46"
equation "\"d48\" = d47"
equation "\"d49\" = d48"
properties part number "CNC-028-WireTrack1" material "ABS Plastic"
